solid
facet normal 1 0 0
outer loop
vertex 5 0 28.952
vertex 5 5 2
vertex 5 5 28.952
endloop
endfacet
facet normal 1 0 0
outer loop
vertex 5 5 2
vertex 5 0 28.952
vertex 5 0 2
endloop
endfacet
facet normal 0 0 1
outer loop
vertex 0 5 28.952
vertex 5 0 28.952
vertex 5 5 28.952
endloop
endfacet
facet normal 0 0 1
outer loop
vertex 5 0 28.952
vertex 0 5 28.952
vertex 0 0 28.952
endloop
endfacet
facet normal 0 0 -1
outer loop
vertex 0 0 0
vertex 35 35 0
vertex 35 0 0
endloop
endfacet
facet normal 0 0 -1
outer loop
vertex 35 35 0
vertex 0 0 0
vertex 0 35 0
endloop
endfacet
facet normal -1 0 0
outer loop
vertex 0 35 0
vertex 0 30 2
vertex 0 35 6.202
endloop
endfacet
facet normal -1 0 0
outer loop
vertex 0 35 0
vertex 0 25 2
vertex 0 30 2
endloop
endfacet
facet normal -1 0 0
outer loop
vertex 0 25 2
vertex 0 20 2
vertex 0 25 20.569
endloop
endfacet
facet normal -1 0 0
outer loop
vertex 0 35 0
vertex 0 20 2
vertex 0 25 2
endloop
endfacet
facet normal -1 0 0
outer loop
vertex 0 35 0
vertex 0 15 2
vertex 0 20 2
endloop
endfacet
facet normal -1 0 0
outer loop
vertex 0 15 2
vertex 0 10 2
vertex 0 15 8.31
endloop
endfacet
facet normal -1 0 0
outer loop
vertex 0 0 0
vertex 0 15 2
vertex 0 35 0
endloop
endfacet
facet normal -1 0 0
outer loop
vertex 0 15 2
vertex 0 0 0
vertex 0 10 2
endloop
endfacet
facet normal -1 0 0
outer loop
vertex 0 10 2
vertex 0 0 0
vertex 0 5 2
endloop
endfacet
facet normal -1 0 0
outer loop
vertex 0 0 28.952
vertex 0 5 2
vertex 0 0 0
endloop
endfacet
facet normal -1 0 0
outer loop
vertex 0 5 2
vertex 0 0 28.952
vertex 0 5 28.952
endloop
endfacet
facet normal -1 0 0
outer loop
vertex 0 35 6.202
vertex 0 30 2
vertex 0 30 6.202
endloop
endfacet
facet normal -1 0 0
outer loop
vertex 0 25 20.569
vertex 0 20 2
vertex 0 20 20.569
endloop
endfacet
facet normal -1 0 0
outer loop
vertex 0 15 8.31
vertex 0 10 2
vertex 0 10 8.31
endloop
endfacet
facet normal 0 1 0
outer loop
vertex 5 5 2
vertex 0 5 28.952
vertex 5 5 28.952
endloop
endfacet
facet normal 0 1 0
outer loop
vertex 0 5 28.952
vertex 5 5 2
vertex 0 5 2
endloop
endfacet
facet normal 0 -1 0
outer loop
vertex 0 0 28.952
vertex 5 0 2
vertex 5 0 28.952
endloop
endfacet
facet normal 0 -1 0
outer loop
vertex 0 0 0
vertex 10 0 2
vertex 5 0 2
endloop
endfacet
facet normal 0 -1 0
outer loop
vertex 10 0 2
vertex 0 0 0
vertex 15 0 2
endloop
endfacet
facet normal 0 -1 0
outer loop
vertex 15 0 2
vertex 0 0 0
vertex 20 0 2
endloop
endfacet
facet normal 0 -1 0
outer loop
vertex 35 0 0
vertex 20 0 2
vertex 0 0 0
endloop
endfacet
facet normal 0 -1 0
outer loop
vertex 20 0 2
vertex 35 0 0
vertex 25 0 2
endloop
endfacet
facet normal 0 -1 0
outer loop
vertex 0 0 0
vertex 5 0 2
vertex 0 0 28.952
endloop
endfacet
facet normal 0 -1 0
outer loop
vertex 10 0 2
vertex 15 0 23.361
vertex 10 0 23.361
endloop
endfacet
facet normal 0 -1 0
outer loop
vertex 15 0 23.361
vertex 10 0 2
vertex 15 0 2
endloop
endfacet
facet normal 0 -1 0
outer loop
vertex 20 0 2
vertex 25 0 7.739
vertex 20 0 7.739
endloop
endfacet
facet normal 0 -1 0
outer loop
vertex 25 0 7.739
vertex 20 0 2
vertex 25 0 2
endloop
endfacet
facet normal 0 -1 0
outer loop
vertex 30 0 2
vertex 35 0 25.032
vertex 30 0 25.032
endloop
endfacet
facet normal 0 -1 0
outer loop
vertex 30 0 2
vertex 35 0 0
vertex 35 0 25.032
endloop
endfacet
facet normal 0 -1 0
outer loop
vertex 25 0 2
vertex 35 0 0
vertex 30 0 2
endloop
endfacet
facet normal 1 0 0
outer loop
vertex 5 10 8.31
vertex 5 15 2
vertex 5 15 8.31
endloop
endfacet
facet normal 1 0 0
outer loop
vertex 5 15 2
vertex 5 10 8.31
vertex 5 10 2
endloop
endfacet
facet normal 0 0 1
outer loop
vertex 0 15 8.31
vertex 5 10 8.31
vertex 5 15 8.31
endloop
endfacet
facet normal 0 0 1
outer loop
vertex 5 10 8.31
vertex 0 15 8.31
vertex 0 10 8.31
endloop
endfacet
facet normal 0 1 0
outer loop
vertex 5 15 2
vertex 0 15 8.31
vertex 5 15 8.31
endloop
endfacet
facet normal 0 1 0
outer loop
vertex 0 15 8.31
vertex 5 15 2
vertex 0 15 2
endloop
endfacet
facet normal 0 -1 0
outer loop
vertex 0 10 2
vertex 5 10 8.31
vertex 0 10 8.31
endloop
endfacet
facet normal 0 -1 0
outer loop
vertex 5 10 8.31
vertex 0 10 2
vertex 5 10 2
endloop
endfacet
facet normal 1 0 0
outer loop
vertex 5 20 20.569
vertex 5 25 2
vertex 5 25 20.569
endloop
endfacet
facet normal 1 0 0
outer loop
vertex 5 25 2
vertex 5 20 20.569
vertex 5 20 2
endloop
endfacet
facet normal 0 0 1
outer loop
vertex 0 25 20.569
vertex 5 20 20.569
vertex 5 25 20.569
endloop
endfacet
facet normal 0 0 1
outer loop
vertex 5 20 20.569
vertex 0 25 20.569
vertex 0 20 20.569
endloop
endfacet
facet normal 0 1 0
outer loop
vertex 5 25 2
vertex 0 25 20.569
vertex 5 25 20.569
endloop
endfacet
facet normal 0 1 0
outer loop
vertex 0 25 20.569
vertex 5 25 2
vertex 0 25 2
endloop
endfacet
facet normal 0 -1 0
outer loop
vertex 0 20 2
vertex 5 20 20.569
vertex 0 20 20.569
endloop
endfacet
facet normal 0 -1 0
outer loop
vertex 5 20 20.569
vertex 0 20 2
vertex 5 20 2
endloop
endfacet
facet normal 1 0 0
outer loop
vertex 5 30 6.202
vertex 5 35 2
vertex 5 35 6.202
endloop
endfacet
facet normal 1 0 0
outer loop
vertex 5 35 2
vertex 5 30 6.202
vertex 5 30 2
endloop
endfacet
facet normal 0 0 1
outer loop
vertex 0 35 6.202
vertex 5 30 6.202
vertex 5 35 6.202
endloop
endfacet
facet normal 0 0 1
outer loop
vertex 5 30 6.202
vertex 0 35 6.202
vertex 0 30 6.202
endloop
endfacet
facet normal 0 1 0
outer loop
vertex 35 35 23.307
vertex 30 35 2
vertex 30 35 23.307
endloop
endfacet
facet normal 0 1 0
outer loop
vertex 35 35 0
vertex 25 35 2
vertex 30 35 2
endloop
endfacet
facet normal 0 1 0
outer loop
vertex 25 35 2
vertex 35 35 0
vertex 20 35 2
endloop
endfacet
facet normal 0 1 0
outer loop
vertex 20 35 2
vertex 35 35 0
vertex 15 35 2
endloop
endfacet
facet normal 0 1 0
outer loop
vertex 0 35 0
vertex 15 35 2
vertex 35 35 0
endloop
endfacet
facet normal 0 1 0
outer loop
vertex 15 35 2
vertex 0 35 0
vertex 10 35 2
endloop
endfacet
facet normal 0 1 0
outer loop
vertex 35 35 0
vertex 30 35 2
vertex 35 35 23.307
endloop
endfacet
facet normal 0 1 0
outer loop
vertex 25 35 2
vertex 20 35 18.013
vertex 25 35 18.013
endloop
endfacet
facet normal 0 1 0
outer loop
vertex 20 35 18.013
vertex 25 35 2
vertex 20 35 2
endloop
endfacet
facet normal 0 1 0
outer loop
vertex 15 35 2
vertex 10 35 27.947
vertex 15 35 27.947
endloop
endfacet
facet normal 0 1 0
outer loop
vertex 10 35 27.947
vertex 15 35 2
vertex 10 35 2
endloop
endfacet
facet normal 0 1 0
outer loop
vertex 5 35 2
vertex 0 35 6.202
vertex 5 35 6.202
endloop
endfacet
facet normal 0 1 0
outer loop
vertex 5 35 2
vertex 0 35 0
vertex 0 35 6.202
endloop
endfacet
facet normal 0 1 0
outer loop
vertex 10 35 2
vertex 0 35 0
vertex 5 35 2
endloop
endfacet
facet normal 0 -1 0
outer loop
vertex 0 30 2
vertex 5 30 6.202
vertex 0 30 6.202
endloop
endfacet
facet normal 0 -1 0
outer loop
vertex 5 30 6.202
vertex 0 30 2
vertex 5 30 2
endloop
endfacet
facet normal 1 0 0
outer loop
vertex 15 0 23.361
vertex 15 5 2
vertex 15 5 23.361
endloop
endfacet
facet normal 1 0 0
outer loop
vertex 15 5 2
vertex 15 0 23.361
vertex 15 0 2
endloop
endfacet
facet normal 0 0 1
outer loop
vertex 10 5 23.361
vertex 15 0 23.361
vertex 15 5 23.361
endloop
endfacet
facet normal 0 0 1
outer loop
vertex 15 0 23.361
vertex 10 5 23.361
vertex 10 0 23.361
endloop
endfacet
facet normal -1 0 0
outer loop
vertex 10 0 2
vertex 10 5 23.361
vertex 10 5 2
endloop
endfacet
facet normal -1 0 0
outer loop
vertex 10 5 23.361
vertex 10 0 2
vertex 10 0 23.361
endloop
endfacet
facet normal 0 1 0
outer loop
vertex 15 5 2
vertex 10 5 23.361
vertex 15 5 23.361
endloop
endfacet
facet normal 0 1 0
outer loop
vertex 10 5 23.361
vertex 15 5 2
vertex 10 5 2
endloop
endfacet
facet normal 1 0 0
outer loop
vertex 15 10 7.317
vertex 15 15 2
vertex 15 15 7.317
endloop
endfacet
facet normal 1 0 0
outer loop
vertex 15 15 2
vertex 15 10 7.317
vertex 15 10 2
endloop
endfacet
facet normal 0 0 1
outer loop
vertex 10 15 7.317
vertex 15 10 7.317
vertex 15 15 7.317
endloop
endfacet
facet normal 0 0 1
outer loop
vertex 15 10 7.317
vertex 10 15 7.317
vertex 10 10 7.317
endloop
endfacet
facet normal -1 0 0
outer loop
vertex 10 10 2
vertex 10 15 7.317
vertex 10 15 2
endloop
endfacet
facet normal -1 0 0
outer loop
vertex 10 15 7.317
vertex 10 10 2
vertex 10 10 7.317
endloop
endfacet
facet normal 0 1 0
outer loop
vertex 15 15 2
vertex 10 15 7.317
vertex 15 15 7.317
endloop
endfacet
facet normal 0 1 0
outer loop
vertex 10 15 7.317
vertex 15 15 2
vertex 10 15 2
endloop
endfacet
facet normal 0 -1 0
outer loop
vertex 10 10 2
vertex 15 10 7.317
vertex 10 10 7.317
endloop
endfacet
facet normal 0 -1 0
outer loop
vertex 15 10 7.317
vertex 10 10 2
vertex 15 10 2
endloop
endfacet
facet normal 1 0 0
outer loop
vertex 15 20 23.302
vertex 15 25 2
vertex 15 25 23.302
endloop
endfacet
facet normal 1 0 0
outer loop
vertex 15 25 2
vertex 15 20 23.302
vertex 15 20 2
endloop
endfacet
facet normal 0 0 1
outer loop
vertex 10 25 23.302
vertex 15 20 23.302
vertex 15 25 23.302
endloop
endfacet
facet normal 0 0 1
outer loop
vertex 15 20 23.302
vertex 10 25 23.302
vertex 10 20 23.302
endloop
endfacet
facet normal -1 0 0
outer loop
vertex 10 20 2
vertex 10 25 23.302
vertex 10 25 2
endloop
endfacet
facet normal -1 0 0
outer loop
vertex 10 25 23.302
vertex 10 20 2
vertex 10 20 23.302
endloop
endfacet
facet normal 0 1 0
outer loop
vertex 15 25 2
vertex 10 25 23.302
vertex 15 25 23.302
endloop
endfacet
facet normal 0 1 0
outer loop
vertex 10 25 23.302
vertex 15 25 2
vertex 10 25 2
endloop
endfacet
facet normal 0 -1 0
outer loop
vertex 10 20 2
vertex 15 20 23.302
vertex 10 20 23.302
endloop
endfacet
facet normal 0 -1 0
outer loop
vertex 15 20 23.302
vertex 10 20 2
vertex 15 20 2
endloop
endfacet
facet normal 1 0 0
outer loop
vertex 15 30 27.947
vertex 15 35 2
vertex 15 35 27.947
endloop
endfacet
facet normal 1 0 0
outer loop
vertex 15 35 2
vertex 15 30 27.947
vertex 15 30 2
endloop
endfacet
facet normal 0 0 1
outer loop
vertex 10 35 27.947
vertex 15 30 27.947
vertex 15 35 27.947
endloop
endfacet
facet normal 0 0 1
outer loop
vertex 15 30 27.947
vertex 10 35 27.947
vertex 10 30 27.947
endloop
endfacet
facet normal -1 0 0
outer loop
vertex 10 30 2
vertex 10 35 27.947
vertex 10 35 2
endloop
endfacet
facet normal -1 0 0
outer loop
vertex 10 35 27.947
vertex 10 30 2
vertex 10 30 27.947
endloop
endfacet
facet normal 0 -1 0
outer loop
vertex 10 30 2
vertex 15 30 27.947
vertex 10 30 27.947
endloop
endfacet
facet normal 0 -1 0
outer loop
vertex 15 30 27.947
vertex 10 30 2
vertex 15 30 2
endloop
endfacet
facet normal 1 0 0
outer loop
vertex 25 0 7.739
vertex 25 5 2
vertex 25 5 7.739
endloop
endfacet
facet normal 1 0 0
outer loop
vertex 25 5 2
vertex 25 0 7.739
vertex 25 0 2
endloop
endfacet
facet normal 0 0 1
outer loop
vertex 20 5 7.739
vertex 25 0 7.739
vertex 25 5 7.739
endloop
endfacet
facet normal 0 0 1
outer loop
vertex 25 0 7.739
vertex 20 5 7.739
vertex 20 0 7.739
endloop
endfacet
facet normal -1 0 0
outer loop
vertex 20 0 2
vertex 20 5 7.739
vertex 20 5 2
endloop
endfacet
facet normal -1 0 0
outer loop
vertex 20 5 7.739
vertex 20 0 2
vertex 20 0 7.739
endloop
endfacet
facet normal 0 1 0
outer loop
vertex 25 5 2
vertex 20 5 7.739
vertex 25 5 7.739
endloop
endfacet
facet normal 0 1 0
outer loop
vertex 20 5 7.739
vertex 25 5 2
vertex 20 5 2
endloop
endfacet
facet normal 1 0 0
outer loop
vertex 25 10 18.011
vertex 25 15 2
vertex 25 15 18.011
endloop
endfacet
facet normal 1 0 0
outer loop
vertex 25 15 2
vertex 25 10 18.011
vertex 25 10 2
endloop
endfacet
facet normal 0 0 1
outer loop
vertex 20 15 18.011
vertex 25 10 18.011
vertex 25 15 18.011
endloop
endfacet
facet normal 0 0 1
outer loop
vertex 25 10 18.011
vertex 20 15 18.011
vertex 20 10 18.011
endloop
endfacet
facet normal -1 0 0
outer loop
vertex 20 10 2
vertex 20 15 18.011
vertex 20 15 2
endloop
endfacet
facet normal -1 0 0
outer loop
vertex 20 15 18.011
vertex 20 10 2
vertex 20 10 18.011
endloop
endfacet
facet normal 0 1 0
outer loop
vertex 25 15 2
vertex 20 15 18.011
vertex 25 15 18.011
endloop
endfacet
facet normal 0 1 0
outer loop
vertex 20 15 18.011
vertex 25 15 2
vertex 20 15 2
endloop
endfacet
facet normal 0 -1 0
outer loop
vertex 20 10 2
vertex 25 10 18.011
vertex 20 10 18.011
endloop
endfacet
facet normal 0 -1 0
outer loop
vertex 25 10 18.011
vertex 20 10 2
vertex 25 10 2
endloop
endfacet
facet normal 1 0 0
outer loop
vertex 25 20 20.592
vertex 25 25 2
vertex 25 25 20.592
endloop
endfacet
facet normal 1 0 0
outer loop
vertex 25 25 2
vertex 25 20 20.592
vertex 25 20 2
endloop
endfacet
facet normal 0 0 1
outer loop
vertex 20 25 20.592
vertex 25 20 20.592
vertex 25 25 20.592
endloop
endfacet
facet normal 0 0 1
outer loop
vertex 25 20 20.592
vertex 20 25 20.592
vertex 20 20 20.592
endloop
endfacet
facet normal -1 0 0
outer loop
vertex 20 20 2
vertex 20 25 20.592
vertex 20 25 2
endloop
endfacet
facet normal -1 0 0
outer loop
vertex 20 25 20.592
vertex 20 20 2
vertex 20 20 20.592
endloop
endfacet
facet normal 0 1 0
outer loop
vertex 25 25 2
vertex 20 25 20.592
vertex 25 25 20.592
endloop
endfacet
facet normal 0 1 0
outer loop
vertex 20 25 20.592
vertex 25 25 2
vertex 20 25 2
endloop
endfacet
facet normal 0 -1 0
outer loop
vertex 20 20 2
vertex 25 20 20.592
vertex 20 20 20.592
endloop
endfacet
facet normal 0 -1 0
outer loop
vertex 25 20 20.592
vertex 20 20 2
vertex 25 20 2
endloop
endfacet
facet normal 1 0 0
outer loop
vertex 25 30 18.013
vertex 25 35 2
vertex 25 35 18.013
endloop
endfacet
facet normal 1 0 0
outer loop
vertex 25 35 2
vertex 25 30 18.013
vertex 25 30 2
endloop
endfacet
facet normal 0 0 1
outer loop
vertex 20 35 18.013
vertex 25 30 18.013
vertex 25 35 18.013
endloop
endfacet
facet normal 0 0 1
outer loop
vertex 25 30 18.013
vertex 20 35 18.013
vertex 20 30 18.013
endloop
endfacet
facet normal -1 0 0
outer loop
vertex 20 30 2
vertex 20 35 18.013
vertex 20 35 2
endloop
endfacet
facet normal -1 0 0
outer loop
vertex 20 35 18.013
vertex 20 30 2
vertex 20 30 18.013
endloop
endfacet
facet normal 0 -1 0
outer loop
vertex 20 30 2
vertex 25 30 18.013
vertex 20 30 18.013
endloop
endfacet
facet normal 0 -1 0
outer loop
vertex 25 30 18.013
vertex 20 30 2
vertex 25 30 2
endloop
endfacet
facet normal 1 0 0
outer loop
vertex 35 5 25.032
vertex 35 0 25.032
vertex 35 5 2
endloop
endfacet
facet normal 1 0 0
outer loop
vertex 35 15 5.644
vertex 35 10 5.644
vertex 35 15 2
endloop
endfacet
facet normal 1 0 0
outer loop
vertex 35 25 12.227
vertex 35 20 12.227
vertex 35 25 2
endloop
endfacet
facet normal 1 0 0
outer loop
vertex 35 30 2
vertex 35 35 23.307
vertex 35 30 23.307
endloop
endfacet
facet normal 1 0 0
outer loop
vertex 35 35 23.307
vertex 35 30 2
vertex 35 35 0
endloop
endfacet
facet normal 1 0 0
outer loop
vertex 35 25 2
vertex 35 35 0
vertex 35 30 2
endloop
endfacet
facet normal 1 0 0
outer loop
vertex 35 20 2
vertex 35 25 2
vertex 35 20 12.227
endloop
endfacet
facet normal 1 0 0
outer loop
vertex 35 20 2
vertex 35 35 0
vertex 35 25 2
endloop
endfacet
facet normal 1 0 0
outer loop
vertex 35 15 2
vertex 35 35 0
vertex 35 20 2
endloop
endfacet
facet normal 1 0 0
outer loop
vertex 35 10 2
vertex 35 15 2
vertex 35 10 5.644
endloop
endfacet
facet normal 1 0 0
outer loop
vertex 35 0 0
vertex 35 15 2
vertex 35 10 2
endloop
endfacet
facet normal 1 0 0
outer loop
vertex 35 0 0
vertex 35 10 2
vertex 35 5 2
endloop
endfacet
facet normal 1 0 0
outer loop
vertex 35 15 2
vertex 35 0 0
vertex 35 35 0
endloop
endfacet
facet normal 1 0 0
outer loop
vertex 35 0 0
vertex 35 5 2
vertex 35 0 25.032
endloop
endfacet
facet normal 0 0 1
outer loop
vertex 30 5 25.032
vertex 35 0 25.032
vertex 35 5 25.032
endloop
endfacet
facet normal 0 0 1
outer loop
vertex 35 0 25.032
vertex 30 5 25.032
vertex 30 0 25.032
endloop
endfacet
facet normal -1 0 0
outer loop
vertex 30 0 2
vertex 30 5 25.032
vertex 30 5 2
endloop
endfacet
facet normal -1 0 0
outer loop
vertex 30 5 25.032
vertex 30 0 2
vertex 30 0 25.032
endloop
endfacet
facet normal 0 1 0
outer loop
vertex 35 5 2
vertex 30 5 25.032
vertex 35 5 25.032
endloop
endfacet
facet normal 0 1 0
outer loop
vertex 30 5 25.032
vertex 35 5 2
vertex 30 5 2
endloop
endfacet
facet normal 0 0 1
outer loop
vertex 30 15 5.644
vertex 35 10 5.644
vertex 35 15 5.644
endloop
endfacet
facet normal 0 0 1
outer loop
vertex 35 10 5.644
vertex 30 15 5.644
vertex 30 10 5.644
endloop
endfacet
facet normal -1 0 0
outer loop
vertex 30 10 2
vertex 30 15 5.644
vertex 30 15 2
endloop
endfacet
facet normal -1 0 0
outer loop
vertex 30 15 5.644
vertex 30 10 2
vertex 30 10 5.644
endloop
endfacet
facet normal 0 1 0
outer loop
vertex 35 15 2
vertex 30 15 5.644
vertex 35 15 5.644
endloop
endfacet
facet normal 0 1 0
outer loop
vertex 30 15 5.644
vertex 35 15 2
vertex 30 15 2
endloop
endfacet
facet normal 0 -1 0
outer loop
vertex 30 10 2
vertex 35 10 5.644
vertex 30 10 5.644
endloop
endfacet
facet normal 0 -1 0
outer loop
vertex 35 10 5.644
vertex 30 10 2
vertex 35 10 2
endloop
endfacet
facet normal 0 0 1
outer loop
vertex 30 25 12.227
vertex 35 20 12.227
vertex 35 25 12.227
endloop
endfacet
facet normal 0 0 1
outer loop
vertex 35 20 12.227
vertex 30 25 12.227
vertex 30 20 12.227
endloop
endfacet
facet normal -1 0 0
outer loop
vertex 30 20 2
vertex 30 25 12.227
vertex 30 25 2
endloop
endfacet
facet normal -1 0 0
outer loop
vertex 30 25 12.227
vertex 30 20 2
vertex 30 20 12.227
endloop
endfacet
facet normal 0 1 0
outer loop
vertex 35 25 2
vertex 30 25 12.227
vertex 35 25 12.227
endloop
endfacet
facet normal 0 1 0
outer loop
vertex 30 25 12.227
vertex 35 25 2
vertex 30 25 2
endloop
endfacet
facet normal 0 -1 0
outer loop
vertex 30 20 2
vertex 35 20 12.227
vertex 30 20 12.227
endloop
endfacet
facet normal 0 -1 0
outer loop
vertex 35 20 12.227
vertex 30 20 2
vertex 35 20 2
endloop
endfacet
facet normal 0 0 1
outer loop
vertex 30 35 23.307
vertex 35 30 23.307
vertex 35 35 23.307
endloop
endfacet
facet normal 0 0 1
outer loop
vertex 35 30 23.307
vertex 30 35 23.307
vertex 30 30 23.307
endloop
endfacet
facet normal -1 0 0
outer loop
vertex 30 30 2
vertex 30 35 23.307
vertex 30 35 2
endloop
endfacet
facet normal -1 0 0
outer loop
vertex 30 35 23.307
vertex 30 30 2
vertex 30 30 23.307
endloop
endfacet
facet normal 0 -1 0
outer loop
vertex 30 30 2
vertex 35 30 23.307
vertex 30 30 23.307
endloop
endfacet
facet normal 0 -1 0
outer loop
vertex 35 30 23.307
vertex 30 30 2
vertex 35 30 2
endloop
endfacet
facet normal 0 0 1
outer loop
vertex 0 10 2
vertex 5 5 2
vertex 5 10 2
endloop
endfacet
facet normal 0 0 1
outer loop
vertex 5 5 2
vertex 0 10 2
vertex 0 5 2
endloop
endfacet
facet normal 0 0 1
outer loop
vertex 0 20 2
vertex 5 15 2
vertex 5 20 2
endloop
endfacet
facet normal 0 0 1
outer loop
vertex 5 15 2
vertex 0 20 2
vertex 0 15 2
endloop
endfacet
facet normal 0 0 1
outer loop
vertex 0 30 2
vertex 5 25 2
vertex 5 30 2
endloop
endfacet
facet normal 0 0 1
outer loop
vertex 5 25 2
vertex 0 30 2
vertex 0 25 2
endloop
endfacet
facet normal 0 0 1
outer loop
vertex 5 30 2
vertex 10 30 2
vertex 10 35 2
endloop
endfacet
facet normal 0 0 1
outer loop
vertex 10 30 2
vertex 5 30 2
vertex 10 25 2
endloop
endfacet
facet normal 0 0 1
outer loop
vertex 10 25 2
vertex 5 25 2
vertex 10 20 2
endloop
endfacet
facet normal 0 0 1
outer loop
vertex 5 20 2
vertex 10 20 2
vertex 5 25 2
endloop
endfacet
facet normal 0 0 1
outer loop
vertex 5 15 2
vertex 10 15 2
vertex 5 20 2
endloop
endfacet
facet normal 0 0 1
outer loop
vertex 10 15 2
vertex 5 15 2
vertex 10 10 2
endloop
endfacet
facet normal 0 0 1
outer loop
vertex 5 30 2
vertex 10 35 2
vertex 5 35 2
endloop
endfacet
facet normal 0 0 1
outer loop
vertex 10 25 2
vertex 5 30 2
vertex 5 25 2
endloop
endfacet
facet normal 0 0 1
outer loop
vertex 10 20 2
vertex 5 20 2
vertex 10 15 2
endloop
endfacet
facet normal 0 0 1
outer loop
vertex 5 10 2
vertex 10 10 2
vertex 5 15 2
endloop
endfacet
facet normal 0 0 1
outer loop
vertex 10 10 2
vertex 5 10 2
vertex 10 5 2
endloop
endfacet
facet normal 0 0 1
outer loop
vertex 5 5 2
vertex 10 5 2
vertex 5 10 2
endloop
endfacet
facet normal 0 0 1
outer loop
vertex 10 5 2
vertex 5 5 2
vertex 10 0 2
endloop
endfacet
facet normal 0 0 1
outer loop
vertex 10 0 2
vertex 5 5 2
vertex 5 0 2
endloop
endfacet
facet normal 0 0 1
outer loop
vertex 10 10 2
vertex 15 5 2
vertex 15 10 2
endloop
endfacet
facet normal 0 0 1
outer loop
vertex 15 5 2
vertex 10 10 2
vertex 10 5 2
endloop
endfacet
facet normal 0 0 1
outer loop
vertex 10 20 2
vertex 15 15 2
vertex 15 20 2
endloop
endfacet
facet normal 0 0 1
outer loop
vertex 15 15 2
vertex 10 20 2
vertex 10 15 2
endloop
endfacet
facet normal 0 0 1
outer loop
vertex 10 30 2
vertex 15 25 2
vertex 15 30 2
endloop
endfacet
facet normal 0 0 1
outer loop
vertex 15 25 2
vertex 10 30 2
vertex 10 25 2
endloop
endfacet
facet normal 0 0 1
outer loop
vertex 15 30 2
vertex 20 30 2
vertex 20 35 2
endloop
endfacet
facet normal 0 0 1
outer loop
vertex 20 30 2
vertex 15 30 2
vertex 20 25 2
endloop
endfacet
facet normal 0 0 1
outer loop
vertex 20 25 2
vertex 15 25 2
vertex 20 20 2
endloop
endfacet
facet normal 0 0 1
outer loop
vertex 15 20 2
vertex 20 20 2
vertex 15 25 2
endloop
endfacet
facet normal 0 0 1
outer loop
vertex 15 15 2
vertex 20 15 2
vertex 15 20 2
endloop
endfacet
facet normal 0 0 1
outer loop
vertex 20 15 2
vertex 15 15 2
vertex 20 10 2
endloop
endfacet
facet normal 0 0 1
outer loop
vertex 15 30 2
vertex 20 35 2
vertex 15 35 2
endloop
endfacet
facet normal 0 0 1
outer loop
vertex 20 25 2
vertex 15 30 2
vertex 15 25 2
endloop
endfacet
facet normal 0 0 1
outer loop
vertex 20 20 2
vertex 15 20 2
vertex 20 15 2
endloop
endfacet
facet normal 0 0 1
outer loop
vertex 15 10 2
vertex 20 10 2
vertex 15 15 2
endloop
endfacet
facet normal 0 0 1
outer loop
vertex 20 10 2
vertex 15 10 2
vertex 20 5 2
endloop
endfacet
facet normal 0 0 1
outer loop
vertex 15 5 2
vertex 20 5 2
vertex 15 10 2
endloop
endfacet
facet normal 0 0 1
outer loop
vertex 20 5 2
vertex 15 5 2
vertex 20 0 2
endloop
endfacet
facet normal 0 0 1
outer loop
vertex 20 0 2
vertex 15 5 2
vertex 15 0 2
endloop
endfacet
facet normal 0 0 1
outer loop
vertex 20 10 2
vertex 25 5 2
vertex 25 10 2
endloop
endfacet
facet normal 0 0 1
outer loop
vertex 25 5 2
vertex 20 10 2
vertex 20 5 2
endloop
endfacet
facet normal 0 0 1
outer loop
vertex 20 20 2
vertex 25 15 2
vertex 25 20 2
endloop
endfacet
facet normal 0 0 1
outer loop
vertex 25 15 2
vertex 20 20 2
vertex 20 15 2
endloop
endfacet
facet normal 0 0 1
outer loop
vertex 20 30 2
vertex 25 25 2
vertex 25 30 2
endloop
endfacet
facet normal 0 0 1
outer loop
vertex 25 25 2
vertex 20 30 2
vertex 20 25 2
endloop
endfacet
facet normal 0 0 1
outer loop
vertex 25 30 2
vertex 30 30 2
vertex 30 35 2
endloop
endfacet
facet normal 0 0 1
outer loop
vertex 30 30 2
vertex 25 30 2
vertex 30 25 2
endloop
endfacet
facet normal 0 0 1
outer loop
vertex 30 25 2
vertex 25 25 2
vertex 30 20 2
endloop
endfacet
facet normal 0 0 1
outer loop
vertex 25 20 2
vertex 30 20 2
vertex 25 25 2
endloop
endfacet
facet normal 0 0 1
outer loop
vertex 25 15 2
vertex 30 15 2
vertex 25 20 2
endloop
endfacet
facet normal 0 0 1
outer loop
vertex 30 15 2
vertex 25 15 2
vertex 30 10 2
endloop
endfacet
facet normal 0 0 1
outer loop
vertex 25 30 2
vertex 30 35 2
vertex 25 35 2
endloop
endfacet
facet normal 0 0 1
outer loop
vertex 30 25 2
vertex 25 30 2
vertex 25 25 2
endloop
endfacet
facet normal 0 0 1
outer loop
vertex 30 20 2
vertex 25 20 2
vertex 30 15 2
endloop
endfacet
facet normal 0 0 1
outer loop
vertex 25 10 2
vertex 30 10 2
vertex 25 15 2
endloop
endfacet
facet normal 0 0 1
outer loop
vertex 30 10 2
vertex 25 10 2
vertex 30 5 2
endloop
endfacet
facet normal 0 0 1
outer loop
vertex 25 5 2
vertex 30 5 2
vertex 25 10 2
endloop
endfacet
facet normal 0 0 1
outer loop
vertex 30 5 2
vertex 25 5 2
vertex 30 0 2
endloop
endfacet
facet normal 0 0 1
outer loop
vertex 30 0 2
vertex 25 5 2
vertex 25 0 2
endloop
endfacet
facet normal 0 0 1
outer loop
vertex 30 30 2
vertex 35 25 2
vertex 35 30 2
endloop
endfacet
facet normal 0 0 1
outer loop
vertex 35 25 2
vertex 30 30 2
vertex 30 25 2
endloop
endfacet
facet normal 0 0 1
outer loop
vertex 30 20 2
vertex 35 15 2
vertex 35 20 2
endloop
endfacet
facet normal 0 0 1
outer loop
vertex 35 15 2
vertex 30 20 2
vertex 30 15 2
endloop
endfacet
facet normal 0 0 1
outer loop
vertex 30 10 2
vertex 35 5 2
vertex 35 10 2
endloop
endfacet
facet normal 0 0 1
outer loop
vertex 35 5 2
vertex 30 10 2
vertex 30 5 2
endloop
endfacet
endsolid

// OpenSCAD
cube([35, 35, 2]);
for(x = [0:10:30]) {
	for(y = [0:10:30]) {
		translate([x, y, 0]) {
			cube([5, 5, rands(4, 30, 1)[0]]);
		}
	}
}
